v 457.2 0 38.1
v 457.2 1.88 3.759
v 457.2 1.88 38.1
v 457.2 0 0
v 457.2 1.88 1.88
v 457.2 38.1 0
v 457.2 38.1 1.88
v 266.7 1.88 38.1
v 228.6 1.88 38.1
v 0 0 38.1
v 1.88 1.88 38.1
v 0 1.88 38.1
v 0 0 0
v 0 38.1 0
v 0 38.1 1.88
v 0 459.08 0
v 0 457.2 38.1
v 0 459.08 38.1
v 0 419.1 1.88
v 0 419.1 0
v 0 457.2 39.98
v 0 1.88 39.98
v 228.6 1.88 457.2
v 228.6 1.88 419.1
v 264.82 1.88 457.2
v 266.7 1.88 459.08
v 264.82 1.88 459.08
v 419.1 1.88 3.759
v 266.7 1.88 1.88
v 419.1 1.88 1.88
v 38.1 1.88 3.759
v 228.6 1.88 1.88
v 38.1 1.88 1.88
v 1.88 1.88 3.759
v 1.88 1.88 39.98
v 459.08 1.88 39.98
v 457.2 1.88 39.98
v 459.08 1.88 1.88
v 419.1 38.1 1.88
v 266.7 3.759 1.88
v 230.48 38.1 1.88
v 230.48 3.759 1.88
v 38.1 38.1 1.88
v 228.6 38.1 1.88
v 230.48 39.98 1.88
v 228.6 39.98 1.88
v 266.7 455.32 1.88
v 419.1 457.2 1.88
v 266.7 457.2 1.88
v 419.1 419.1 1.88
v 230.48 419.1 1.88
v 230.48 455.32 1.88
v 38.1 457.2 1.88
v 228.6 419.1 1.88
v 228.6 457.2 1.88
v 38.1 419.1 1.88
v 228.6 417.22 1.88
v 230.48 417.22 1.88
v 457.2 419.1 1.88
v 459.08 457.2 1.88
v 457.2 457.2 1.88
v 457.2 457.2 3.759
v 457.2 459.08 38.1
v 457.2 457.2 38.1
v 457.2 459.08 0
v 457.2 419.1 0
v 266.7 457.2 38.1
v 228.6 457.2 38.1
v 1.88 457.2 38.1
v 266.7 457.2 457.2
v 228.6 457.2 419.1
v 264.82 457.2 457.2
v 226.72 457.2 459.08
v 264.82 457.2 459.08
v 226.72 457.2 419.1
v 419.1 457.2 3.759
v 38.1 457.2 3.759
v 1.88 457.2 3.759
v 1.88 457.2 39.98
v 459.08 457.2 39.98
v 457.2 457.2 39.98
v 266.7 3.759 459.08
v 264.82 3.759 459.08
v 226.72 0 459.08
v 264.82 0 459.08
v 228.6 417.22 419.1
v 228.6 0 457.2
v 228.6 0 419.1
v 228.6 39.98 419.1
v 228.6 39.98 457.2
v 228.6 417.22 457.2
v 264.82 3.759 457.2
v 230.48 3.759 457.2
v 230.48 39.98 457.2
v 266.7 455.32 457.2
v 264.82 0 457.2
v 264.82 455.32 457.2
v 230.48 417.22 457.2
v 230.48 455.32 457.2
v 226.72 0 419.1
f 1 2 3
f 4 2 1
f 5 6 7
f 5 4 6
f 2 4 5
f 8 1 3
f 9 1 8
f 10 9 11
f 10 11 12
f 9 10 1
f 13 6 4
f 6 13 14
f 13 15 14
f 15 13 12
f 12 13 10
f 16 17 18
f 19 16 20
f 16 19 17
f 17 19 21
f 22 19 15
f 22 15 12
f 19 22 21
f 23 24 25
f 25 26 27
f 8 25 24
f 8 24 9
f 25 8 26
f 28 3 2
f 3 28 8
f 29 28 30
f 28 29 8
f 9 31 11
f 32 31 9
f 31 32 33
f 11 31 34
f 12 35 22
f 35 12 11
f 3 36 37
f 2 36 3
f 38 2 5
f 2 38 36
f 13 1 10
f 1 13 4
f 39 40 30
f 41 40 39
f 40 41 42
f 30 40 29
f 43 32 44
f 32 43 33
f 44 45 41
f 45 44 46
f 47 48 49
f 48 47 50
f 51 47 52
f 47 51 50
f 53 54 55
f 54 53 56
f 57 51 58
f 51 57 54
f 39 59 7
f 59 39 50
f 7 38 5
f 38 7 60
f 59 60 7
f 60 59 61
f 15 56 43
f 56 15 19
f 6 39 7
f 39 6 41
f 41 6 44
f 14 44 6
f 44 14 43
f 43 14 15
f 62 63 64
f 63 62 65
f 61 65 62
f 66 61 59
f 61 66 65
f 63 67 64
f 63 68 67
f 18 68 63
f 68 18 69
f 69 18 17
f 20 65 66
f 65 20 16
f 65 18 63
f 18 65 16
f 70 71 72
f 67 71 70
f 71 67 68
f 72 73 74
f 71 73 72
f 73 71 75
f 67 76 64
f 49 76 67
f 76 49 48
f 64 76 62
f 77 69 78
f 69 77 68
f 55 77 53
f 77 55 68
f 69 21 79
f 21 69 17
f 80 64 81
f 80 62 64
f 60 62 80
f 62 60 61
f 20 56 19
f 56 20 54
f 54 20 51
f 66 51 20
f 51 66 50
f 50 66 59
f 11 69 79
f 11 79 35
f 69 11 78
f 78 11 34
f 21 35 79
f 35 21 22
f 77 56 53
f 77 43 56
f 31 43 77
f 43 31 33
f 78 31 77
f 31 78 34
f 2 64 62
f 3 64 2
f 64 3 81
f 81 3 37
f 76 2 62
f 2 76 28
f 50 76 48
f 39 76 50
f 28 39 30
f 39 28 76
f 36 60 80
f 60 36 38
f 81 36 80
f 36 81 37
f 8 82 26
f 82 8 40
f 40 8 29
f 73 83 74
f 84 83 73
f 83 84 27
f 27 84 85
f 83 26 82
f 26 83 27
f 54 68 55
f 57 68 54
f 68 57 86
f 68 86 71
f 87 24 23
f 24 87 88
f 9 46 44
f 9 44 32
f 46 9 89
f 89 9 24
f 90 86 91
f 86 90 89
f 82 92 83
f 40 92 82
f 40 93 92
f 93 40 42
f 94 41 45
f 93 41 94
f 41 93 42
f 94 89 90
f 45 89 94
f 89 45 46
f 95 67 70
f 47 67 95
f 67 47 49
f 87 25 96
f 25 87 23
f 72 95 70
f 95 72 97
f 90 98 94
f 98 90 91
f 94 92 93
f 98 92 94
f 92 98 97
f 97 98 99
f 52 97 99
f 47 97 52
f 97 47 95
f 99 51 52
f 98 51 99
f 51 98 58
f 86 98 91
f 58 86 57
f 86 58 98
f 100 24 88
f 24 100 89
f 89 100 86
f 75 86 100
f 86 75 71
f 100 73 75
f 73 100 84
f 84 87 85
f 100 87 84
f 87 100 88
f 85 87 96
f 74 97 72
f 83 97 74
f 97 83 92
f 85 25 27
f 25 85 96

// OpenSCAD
// 457.20 mm = 18 inches
// 38.1mm = 1.5 inches
// 1.8796mm= 0.074 inches

// variables
length=457.2;
width=38.1;
thickness=1.8796;


{
// frame bottom
color("red")
{
union () 
{
 //angle bottom left
cube ([length,thickness,width]);
cube ([length,width,thickness]);
}
union ()  
{
  //angle bottom right
  translate ([0,length,0]) cube ([length,thickness,width]);
  translate ([0,length-width,0]) cube ([length,width,thickness]);
  }
}
  
color("blue")
{
union()
{
  //angle bottom rear
  translate([0,thickness,thickness]) //lift the frame to overlap
  cube ([thickness,length-thickness,width]);
  translate([0,thickness,thickness])
  cube ([width,length-thickness,thickness]);
  }
union()
{
  //angle bottom front
  translate([length-width,thickness,thickness])
  cube ([width,length-thickness,thickness]);
  translate([length,thickness,thickness])
  cube ([thickness,length-thickness,width]);
  }
}
}

//frame sides
union() //upright left
{
  translate([length/2,thickness,thickness])
  cube([width,thickness,length]);
  translate([length/2,thickness,thickness])
  cube([thickness,width,length]);

  }
union() //upright right
{
  translate([length/2,length-thickness,thickness])
  cube([width,thickness,length-thickness]);
  translate([length/2,length-thickness-width,thickness])
  cube([thickness,width,length-thickness]);
  
  }
//frame top
color("green")union()
{
  translate([length/2-thickness,0,length-width])
  cube([thickness,length,width]);
  translate([length/2-thickness,0,length])
  cube([width,length,thickness]);
  }
